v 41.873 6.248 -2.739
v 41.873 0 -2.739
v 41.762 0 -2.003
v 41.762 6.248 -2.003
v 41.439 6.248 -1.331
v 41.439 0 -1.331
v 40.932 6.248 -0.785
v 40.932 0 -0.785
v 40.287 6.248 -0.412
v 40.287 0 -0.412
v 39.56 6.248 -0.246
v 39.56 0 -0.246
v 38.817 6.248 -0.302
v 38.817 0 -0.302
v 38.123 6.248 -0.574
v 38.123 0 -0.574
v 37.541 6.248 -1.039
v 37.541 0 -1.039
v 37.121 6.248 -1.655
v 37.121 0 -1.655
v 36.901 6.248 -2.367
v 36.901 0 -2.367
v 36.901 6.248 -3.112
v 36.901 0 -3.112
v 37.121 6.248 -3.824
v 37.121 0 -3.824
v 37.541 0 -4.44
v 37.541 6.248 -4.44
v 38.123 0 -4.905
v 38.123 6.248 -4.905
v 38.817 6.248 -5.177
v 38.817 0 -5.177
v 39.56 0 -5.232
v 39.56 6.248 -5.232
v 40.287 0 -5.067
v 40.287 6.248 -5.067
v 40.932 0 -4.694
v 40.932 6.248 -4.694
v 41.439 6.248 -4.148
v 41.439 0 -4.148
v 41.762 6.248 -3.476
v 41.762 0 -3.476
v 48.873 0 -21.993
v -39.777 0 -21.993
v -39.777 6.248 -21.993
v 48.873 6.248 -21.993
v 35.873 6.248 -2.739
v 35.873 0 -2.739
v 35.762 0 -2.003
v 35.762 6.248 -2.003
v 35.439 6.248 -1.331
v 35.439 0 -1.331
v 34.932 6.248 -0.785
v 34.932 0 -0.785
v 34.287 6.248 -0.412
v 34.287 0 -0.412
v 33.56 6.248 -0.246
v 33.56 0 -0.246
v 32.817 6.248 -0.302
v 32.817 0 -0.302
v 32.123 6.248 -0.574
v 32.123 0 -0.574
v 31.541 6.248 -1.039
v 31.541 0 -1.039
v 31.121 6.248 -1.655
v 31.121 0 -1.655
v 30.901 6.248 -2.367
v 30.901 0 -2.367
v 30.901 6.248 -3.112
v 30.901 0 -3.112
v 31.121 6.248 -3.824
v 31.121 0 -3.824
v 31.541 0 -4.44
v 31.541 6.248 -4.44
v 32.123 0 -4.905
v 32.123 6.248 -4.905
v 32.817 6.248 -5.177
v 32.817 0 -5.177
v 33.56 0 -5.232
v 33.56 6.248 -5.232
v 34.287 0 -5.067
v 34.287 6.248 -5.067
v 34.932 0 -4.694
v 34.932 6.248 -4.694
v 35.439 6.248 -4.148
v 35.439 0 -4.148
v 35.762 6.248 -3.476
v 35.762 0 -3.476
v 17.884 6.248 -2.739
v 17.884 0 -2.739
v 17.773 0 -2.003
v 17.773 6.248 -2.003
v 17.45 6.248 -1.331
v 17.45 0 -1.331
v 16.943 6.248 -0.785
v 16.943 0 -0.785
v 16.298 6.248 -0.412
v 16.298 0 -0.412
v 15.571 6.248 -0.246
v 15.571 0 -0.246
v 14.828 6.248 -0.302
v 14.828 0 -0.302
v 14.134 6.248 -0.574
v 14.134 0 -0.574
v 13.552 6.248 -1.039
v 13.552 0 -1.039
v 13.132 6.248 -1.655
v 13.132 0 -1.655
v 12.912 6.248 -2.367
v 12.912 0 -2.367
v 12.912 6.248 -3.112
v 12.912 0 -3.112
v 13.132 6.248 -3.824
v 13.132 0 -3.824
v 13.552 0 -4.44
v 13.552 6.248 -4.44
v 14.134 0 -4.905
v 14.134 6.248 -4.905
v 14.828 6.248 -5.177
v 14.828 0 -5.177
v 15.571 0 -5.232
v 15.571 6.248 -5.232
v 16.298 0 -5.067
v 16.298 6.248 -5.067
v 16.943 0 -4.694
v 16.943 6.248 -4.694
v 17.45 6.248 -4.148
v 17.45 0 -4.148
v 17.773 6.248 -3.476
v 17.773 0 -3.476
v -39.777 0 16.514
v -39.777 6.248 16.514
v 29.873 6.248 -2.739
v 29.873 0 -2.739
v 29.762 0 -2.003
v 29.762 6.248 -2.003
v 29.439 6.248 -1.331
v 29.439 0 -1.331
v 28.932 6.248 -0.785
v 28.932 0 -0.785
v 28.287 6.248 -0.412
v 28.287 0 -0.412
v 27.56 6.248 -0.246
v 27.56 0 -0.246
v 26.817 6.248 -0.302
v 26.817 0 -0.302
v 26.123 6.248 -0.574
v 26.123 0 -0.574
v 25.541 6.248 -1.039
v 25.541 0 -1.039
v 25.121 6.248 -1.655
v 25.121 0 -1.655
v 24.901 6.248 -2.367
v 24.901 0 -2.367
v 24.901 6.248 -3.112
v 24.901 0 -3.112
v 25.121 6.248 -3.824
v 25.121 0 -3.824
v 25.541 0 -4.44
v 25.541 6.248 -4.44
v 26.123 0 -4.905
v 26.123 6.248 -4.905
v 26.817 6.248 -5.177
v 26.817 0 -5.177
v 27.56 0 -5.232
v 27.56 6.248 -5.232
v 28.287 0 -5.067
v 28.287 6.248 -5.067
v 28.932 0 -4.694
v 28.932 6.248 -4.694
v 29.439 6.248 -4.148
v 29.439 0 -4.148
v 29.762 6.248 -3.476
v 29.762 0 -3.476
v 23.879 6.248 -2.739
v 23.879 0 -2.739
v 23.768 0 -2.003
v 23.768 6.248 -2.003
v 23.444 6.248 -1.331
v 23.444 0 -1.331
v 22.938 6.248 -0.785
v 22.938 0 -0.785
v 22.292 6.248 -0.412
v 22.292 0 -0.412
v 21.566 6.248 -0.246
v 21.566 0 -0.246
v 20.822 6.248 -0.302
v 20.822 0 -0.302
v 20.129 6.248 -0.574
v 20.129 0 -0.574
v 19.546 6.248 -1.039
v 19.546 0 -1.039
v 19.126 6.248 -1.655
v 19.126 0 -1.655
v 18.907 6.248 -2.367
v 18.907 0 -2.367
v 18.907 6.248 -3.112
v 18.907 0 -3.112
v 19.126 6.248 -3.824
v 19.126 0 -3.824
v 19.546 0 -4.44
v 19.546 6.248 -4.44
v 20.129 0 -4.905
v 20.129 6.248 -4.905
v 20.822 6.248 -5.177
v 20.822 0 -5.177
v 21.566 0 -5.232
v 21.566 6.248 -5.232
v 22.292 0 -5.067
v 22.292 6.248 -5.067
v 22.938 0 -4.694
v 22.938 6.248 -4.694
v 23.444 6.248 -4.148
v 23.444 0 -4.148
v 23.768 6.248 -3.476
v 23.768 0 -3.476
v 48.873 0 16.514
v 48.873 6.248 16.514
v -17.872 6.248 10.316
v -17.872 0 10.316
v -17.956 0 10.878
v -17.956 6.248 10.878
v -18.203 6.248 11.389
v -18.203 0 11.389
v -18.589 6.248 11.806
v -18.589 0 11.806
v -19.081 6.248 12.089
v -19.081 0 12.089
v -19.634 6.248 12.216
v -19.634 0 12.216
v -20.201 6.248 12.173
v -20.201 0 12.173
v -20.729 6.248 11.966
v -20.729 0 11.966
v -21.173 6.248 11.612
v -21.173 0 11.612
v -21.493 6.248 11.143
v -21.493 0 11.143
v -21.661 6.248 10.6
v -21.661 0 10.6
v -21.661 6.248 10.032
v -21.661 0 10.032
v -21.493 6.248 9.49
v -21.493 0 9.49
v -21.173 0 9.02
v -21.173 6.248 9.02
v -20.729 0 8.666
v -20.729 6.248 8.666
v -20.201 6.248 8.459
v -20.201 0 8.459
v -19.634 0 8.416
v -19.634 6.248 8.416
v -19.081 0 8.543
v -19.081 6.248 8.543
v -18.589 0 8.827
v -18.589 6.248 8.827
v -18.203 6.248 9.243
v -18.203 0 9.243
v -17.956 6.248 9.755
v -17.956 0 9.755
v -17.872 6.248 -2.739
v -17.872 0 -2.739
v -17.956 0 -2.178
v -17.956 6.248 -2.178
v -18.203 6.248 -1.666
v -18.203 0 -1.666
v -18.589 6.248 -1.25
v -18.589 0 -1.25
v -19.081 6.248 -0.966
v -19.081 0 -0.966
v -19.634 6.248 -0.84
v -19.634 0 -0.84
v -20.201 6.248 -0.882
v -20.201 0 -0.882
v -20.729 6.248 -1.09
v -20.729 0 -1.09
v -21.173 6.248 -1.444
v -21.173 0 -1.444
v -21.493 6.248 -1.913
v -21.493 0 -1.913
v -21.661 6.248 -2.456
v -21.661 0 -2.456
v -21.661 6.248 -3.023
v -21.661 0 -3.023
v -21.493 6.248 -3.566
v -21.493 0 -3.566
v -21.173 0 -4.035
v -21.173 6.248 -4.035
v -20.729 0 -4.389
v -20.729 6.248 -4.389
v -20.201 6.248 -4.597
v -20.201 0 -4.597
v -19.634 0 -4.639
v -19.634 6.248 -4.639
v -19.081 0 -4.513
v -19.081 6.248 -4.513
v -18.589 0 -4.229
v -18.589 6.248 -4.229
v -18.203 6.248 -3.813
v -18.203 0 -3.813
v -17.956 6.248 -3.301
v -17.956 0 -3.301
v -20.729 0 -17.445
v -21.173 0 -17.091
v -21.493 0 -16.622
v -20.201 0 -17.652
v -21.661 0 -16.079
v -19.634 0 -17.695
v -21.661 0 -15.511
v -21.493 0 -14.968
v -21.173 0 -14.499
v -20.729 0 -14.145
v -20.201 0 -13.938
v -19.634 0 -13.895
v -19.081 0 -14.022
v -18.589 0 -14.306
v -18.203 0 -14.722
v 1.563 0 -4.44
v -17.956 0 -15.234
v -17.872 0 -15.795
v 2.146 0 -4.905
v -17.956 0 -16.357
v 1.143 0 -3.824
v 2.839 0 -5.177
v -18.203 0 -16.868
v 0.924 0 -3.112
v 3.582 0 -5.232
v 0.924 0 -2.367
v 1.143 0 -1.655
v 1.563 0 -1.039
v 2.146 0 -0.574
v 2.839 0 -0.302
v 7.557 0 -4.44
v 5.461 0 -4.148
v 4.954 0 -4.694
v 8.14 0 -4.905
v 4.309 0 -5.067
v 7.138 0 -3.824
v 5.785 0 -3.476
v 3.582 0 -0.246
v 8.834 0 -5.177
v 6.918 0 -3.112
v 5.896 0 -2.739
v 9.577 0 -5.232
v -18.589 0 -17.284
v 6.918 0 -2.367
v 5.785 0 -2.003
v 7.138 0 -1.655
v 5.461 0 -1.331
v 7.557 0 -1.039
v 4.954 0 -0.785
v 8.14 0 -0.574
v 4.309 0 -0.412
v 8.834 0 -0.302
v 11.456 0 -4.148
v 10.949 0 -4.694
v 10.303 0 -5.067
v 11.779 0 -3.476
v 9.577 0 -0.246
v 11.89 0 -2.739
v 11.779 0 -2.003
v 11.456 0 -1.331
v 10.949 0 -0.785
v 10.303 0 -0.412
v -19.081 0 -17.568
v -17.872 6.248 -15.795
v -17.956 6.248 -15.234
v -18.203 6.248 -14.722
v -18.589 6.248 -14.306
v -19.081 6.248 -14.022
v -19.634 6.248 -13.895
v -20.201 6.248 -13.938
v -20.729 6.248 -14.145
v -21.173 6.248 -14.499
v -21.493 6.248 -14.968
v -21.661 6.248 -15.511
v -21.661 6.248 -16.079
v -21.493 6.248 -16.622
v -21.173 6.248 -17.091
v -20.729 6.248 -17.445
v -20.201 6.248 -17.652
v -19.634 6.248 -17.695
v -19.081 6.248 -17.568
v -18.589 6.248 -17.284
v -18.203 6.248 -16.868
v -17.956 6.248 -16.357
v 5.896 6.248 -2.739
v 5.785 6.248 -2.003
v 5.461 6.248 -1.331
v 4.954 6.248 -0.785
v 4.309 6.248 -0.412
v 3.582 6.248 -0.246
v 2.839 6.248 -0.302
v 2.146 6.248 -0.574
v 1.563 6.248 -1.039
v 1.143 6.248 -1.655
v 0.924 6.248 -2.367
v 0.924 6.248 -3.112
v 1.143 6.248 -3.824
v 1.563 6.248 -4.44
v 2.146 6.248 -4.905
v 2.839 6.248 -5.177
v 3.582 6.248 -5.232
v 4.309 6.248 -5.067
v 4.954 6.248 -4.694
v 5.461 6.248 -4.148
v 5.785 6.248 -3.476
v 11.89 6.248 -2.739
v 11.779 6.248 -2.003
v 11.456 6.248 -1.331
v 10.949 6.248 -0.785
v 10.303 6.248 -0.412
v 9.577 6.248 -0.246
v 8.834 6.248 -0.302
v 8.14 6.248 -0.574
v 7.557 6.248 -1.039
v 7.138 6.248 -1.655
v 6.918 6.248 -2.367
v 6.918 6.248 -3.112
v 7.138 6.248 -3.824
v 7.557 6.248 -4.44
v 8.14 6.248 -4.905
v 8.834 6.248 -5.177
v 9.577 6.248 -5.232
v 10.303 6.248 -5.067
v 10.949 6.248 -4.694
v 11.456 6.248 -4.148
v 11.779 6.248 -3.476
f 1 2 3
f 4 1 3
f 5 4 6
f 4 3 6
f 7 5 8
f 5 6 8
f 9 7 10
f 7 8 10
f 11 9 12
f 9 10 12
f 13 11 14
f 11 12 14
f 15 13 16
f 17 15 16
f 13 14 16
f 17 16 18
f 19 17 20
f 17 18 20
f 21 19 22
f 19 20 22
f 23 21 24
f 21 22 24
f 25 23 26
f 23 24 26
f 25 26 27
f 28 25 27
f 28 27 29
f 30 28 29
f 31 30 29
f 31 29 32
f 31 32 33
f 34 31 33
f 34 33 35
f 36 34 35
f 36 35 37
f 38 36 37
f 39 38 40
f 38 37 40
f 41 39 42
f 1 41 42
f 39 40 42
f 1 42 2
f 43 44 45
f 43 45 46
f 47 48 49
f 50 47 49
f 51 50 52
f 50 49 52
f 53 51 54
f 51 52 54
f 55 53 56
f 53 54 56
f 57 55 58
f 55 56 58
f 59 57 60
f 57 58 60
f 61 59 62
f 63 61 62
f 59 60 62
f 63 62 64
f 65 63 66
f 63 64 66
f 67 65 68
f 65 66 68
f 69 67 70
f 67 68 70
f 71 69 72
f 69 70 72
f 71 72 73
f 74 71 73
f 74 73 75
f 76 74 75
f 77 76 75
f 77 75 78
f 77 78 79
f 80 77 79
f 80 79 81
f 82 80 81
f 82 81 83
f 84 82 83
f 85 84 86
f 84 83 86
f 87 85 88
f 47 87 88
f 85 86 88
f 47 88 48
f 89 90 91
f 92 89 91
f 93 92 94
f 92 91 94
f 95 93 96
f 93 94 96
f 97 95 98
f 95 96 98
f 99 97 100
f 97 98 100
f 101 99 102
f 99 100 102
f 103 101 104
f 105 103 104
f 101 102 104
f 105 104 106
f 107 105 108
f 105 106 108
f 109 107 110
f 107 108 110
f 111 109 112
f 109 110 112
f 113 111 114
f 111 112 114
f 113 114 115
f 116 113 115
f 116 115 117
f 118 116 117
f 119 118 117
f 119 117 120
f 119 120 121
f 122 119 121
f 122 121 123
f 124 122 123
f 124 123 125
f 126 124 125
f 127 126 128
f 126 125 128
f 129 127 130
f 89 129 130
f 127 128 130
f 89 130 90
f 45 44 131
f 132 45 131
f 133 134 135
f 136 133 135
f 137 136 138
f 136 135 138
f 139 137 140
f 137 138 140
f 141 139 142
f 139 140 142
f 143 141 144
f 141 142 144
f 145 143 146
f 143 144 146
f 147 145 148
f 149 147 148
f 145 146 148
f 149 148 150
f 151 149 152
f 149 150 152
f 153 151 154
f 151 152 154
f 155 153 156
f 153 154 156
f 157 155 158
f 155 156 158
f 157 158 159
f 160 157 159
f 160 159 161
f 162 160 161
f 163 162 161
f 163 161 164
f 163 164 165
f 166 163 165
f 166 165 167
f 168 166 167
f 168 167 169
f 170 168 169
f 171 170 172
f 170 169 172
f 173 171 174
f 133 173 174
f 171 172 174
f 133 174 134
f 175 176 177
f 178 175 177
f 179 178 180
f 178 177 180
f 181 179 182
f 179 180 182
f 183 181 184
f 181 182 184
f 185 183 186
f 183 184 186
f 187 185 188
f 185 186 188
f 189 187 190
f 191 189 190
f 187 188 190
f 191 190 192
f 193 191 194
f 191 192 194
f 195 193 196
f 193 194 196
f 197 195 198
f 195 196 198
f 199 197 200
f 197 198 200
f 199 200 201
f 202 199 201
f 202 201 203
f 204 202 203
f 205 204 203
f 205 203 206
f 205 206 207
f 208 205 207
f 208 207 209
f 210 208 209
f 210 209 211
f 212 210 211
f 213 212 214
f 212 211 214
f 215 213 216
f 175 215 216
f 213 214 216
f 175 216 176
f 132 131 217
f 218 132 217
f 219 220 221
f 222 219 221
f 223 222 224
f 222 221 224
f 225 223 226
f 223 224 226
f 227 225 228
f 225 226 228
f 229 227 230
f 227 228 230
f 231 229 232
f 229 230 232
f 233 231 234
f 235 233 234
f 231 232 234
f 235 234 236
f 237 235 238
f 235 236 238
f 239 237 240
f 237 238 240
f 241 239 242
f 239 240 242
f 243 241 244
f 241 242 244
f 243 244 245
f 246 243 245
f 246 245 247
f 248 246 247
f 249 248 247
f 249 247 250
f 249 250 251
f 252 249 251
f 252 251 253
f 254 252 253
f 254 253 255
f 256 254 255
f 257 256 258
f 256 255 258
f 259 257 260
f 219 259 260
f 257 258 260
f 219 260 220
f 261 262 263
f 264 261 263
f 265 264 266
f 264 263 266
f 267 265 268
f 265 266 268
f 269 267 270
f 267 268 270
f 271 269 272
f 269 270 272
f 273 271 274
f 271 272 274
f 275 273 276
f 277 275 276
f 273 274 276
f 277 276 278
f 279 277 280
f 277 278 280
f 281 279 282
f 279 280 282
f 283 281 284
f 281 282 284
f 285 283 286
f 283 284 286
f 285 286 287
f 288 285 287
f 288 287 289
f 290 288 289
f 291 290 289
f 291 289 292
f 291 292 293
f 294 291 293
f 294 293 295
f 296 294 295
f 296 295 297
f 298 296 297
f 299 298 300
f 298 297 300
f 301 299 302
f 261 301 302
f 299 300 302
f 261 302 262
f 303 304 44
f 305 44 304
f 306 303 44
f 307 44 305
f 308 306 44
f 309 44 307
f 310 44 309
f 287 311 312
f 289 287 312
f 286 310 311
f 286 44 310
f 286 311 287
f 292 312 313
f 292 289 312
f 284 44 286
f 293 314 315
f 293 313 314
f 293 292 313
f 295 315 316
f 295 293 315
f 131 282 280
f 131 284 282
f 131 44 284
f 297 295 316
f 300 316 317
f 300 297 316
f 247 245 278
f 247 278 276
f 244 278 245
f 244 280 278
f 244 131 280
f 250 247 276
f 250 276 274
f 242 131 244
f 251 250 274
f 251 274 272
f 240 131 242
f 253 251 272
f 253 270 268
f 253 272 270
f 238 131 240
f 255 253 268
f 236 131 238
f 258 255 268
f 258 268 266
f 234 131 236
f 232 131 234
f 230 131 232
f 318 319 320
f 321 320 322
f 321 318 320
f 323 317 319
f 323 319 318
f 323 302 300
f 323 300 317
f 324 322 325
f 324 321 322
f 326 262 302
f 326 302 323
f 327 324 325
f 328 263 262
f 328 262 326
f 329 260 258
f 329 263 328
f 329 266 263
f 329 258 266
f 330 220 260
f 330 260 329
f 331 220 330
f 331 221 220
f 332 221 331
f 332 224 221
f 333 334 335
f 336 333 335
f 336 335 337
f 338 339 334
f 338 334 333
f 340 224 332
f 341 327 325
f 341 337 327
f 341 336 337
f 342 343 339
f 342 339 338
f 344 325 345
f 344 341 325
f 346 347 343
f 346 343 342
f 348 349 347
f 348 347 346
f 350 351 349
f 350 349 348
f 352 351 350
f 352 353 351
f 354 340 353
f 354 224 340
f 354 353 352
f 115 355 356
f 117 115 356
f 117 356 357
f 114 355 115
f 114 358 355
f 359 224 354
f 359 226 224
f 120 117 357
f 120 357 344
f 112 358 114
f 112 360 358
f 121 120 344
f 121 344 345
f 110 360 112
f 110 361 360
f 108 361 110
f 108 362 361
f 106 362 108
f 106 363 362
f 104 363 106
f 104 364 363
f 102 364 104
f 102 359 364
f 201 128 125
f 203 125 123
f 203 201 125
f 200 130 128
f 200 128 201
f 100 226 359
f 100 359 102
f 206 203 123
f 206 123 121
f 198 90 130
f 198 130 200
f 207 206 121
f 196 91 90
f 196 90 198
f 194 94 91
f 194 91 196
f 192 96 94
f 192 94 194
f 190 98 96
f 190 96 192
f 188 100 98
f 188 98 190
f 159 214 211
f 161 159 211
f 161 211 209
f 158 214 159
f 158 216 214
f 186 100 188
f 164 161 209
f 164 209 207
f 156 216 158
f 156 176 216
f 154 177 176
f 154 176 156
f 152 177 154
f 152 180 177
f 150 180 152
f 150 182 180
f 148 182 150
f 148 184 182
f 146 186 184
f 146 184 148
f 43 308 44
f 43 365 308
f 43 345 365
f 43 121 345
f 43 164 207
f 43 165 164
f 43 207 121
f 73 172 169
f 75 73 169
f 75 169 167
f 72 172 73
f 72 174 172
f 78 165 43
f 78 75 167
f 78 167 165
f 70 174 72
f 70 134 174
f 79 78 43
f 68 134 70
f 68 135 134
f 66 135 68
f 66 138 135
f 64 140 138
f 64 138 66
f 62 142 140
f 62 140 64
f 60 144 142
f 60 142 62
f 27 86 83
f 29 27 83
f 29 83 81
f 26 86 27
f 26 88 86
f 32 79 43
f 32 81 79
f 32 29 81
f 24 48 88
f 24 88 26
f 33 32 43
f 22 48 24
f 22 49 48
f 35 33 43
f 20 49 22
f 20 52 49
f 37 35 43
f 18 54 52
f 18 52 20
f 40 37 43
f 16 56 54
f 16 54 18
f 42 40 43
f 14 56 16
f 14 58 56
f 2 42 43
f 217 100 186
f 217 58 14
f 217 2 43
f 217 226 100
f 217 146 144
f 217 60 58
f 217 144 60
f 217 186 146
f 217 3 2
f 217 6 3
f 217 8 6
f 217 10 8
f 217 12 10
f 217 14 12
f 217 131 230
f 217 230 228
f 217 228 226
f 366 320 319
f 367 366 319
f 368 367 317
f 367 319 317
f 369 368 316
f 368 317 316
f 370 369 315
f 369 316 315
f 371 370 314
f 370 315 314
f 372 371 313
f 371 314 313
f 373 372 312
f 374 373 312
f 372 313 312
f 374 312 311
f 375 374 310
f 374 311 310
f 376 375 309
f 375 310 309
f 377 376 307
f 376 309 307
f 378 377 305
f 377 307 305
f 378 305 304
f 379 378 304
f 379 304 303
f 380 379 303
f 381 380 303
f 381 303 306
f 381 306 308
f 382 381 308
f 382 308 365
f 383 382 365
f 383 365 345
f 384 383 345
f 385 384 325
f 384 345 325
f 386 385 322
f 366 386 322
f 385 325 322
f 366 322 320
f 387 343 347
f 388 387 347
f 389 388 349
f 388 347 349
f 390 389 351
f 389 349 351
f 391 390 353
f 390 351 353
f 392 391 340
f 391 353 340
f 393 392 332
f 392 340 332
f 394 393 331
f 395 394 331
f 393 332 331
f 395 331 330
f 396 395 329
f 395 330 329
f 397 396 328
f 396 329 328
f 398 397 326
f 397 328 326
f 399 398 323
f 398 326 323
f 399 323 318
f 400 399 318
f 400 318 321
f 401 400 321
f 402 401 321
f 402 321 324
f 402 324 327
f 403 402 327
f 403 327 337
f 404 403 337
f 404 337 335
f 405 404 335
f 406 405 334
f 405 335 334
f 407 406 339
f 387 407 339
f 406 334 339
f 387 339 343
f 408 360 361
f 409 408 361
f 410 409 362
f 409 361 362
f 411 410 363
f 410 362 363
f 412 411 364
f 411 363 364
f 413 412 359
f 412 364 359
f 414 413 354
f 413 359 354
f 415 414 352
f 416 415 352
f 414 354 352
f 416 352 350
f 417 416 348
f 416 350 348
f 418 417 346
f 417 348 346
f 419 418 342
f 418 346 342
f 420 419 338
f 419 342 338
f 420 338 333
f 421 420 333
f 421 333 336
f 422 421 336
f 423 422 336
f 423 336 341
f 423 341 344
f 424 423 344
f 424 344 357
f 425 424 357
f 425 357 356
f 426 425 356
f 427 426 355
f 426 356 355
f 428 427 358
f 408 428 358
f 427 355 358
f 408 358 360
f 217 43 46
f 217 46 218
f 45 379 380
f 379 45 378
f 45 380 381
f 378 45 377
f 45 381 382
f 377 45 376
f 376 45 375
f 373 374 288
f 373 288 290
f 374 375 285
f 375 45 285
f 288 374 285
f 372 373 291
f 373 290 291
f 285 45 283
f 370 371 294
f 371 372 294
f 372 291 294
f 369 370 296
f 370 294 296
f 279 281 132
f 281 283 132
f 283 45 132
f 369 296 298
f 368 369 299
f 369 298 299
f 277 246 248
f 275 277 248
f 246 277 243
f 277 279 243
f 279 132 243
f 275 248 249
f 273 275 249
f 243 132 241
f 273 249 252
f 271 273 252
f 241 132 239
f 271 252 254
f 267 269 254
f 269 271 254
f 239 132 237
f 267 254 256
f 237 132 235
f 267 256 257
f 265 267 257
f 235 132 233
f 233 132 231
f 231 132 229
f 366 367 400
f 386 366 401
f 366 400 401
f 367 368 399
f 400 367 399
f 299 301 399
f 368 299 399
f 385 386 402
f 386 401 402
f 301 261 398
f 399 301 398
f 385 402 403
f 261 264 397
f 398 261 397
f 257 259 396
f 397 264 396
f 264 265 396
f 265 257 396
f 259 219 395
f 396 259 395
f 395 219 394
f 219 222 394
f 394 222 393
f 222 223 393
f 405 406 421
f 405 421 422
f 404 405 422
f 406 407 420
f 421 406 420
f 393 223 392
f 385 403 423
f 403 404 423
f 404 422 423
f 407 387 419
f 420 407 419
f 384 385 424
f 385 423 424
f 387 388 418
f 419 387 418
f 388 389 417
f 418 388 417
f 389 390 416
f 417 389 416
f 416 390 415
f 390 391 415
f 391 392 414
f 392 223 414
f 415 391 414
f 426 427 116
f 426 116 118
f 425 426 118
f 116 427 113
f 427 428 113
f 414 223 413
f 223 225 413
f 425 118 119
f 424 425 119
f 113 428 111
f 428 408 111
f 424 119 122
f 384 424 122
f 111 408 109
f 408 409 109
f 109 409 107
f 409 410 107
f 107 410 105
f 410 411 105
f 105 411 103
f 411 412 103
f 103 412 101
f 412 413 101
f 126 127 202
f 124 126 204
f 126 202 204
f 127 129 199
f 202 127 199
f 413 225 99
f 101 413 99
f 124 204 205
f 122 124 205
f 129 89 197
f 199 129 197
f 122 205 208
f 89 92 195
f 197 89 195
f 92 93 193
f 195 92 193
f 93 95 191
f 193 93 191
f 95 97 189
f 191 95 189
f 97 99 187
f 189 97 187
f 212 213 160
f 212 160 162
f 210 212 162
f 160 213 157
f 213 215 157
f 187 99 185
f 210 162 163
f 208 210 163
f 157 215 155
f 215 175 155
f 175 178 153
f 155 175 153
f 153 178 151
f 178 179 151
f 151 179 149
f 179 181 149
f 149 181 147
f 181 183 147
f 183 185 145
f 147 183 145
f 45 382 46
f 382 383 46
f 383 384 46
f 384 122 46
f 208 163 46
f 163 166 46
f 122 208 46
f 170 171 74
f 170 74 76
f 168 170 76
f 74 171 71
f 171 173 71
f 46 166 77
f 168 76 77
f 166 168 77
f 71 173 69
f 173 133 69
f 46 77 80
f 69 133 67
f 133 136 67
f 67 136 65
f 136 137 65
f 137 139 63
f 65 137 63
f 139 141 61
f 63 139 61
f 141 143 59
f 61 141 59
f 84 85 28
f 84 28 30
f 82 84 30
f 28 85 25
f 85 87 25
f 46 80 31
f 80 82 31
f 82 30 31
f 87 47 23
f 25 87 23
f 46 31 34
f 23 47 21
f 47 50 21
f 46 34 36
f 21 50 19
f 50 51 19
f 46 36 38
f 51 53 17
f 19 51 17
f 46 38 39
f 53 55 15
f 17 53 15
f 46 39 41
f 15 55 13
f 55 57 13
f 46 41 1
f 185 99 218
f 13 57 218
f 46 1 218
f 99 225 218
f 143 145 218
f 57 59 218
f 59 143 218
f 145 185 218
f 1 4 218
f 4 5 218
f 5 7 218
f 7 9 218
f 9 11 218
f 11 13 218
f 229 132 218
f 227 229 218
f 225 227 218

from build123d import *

# Parameters (mm, degrees)
F0_W     = 88.65
F0_H     = 38.5064
F0_R     = 1.905
F0_R_2   = 2.5
F1_DEPTH = 6.2484


with BuildPart() as f1:
    # F0 (on Front) → F1 (new body)
    with BuildSketch(Plane.XZ):
        with Locations((4.548196, -2.739448)):
            Rectangle(F0_W, F0_H)
        with Locations((-19.776804, -15.795048)):
            Circle(F0_R, mode=Mode.SUBTRACT)
        with Locations((-19.776804, -2.739448)):
            Circle(F0_R, mode=Mode.SUBTRACT)
        with Locations((3.395596, -2.739448)):
            Circle(F0_R_2, mode=Mode.SUBTRACT)
        with Locations((-19.776804, 10.316152)):
            Circle(F0_R, mode=Mode.SUBTRACT)
        with Locations((9.389996, -2.739448)):
            Circle(F0_R_2, mode=Mode.SUBTRACT)
        with Locations((15.384396, -2.739448)):
            Circle(F0_R_2, mode=Mode.SUBTRACT)
        with Locations((21.378796, -2.739448)):
            Circle(F0_R_2, mode=Mode.SUBTRACT)
        with Locations((27.373196, -2.739448)):
            Circle(F0_R_2, mode=Mode.SUBTRACT)
        with Locations((33.373196, -2.739448)):
            Circle(F0_R_2, mode=Mode.SUBTRACT)
        with Locations((39.373196, -2.739448)):
            Circle(F0_R_2, mode=Mode.SUBTRACT)
    extrude(amount=-F1_DEPTH)


solid = f1.part
